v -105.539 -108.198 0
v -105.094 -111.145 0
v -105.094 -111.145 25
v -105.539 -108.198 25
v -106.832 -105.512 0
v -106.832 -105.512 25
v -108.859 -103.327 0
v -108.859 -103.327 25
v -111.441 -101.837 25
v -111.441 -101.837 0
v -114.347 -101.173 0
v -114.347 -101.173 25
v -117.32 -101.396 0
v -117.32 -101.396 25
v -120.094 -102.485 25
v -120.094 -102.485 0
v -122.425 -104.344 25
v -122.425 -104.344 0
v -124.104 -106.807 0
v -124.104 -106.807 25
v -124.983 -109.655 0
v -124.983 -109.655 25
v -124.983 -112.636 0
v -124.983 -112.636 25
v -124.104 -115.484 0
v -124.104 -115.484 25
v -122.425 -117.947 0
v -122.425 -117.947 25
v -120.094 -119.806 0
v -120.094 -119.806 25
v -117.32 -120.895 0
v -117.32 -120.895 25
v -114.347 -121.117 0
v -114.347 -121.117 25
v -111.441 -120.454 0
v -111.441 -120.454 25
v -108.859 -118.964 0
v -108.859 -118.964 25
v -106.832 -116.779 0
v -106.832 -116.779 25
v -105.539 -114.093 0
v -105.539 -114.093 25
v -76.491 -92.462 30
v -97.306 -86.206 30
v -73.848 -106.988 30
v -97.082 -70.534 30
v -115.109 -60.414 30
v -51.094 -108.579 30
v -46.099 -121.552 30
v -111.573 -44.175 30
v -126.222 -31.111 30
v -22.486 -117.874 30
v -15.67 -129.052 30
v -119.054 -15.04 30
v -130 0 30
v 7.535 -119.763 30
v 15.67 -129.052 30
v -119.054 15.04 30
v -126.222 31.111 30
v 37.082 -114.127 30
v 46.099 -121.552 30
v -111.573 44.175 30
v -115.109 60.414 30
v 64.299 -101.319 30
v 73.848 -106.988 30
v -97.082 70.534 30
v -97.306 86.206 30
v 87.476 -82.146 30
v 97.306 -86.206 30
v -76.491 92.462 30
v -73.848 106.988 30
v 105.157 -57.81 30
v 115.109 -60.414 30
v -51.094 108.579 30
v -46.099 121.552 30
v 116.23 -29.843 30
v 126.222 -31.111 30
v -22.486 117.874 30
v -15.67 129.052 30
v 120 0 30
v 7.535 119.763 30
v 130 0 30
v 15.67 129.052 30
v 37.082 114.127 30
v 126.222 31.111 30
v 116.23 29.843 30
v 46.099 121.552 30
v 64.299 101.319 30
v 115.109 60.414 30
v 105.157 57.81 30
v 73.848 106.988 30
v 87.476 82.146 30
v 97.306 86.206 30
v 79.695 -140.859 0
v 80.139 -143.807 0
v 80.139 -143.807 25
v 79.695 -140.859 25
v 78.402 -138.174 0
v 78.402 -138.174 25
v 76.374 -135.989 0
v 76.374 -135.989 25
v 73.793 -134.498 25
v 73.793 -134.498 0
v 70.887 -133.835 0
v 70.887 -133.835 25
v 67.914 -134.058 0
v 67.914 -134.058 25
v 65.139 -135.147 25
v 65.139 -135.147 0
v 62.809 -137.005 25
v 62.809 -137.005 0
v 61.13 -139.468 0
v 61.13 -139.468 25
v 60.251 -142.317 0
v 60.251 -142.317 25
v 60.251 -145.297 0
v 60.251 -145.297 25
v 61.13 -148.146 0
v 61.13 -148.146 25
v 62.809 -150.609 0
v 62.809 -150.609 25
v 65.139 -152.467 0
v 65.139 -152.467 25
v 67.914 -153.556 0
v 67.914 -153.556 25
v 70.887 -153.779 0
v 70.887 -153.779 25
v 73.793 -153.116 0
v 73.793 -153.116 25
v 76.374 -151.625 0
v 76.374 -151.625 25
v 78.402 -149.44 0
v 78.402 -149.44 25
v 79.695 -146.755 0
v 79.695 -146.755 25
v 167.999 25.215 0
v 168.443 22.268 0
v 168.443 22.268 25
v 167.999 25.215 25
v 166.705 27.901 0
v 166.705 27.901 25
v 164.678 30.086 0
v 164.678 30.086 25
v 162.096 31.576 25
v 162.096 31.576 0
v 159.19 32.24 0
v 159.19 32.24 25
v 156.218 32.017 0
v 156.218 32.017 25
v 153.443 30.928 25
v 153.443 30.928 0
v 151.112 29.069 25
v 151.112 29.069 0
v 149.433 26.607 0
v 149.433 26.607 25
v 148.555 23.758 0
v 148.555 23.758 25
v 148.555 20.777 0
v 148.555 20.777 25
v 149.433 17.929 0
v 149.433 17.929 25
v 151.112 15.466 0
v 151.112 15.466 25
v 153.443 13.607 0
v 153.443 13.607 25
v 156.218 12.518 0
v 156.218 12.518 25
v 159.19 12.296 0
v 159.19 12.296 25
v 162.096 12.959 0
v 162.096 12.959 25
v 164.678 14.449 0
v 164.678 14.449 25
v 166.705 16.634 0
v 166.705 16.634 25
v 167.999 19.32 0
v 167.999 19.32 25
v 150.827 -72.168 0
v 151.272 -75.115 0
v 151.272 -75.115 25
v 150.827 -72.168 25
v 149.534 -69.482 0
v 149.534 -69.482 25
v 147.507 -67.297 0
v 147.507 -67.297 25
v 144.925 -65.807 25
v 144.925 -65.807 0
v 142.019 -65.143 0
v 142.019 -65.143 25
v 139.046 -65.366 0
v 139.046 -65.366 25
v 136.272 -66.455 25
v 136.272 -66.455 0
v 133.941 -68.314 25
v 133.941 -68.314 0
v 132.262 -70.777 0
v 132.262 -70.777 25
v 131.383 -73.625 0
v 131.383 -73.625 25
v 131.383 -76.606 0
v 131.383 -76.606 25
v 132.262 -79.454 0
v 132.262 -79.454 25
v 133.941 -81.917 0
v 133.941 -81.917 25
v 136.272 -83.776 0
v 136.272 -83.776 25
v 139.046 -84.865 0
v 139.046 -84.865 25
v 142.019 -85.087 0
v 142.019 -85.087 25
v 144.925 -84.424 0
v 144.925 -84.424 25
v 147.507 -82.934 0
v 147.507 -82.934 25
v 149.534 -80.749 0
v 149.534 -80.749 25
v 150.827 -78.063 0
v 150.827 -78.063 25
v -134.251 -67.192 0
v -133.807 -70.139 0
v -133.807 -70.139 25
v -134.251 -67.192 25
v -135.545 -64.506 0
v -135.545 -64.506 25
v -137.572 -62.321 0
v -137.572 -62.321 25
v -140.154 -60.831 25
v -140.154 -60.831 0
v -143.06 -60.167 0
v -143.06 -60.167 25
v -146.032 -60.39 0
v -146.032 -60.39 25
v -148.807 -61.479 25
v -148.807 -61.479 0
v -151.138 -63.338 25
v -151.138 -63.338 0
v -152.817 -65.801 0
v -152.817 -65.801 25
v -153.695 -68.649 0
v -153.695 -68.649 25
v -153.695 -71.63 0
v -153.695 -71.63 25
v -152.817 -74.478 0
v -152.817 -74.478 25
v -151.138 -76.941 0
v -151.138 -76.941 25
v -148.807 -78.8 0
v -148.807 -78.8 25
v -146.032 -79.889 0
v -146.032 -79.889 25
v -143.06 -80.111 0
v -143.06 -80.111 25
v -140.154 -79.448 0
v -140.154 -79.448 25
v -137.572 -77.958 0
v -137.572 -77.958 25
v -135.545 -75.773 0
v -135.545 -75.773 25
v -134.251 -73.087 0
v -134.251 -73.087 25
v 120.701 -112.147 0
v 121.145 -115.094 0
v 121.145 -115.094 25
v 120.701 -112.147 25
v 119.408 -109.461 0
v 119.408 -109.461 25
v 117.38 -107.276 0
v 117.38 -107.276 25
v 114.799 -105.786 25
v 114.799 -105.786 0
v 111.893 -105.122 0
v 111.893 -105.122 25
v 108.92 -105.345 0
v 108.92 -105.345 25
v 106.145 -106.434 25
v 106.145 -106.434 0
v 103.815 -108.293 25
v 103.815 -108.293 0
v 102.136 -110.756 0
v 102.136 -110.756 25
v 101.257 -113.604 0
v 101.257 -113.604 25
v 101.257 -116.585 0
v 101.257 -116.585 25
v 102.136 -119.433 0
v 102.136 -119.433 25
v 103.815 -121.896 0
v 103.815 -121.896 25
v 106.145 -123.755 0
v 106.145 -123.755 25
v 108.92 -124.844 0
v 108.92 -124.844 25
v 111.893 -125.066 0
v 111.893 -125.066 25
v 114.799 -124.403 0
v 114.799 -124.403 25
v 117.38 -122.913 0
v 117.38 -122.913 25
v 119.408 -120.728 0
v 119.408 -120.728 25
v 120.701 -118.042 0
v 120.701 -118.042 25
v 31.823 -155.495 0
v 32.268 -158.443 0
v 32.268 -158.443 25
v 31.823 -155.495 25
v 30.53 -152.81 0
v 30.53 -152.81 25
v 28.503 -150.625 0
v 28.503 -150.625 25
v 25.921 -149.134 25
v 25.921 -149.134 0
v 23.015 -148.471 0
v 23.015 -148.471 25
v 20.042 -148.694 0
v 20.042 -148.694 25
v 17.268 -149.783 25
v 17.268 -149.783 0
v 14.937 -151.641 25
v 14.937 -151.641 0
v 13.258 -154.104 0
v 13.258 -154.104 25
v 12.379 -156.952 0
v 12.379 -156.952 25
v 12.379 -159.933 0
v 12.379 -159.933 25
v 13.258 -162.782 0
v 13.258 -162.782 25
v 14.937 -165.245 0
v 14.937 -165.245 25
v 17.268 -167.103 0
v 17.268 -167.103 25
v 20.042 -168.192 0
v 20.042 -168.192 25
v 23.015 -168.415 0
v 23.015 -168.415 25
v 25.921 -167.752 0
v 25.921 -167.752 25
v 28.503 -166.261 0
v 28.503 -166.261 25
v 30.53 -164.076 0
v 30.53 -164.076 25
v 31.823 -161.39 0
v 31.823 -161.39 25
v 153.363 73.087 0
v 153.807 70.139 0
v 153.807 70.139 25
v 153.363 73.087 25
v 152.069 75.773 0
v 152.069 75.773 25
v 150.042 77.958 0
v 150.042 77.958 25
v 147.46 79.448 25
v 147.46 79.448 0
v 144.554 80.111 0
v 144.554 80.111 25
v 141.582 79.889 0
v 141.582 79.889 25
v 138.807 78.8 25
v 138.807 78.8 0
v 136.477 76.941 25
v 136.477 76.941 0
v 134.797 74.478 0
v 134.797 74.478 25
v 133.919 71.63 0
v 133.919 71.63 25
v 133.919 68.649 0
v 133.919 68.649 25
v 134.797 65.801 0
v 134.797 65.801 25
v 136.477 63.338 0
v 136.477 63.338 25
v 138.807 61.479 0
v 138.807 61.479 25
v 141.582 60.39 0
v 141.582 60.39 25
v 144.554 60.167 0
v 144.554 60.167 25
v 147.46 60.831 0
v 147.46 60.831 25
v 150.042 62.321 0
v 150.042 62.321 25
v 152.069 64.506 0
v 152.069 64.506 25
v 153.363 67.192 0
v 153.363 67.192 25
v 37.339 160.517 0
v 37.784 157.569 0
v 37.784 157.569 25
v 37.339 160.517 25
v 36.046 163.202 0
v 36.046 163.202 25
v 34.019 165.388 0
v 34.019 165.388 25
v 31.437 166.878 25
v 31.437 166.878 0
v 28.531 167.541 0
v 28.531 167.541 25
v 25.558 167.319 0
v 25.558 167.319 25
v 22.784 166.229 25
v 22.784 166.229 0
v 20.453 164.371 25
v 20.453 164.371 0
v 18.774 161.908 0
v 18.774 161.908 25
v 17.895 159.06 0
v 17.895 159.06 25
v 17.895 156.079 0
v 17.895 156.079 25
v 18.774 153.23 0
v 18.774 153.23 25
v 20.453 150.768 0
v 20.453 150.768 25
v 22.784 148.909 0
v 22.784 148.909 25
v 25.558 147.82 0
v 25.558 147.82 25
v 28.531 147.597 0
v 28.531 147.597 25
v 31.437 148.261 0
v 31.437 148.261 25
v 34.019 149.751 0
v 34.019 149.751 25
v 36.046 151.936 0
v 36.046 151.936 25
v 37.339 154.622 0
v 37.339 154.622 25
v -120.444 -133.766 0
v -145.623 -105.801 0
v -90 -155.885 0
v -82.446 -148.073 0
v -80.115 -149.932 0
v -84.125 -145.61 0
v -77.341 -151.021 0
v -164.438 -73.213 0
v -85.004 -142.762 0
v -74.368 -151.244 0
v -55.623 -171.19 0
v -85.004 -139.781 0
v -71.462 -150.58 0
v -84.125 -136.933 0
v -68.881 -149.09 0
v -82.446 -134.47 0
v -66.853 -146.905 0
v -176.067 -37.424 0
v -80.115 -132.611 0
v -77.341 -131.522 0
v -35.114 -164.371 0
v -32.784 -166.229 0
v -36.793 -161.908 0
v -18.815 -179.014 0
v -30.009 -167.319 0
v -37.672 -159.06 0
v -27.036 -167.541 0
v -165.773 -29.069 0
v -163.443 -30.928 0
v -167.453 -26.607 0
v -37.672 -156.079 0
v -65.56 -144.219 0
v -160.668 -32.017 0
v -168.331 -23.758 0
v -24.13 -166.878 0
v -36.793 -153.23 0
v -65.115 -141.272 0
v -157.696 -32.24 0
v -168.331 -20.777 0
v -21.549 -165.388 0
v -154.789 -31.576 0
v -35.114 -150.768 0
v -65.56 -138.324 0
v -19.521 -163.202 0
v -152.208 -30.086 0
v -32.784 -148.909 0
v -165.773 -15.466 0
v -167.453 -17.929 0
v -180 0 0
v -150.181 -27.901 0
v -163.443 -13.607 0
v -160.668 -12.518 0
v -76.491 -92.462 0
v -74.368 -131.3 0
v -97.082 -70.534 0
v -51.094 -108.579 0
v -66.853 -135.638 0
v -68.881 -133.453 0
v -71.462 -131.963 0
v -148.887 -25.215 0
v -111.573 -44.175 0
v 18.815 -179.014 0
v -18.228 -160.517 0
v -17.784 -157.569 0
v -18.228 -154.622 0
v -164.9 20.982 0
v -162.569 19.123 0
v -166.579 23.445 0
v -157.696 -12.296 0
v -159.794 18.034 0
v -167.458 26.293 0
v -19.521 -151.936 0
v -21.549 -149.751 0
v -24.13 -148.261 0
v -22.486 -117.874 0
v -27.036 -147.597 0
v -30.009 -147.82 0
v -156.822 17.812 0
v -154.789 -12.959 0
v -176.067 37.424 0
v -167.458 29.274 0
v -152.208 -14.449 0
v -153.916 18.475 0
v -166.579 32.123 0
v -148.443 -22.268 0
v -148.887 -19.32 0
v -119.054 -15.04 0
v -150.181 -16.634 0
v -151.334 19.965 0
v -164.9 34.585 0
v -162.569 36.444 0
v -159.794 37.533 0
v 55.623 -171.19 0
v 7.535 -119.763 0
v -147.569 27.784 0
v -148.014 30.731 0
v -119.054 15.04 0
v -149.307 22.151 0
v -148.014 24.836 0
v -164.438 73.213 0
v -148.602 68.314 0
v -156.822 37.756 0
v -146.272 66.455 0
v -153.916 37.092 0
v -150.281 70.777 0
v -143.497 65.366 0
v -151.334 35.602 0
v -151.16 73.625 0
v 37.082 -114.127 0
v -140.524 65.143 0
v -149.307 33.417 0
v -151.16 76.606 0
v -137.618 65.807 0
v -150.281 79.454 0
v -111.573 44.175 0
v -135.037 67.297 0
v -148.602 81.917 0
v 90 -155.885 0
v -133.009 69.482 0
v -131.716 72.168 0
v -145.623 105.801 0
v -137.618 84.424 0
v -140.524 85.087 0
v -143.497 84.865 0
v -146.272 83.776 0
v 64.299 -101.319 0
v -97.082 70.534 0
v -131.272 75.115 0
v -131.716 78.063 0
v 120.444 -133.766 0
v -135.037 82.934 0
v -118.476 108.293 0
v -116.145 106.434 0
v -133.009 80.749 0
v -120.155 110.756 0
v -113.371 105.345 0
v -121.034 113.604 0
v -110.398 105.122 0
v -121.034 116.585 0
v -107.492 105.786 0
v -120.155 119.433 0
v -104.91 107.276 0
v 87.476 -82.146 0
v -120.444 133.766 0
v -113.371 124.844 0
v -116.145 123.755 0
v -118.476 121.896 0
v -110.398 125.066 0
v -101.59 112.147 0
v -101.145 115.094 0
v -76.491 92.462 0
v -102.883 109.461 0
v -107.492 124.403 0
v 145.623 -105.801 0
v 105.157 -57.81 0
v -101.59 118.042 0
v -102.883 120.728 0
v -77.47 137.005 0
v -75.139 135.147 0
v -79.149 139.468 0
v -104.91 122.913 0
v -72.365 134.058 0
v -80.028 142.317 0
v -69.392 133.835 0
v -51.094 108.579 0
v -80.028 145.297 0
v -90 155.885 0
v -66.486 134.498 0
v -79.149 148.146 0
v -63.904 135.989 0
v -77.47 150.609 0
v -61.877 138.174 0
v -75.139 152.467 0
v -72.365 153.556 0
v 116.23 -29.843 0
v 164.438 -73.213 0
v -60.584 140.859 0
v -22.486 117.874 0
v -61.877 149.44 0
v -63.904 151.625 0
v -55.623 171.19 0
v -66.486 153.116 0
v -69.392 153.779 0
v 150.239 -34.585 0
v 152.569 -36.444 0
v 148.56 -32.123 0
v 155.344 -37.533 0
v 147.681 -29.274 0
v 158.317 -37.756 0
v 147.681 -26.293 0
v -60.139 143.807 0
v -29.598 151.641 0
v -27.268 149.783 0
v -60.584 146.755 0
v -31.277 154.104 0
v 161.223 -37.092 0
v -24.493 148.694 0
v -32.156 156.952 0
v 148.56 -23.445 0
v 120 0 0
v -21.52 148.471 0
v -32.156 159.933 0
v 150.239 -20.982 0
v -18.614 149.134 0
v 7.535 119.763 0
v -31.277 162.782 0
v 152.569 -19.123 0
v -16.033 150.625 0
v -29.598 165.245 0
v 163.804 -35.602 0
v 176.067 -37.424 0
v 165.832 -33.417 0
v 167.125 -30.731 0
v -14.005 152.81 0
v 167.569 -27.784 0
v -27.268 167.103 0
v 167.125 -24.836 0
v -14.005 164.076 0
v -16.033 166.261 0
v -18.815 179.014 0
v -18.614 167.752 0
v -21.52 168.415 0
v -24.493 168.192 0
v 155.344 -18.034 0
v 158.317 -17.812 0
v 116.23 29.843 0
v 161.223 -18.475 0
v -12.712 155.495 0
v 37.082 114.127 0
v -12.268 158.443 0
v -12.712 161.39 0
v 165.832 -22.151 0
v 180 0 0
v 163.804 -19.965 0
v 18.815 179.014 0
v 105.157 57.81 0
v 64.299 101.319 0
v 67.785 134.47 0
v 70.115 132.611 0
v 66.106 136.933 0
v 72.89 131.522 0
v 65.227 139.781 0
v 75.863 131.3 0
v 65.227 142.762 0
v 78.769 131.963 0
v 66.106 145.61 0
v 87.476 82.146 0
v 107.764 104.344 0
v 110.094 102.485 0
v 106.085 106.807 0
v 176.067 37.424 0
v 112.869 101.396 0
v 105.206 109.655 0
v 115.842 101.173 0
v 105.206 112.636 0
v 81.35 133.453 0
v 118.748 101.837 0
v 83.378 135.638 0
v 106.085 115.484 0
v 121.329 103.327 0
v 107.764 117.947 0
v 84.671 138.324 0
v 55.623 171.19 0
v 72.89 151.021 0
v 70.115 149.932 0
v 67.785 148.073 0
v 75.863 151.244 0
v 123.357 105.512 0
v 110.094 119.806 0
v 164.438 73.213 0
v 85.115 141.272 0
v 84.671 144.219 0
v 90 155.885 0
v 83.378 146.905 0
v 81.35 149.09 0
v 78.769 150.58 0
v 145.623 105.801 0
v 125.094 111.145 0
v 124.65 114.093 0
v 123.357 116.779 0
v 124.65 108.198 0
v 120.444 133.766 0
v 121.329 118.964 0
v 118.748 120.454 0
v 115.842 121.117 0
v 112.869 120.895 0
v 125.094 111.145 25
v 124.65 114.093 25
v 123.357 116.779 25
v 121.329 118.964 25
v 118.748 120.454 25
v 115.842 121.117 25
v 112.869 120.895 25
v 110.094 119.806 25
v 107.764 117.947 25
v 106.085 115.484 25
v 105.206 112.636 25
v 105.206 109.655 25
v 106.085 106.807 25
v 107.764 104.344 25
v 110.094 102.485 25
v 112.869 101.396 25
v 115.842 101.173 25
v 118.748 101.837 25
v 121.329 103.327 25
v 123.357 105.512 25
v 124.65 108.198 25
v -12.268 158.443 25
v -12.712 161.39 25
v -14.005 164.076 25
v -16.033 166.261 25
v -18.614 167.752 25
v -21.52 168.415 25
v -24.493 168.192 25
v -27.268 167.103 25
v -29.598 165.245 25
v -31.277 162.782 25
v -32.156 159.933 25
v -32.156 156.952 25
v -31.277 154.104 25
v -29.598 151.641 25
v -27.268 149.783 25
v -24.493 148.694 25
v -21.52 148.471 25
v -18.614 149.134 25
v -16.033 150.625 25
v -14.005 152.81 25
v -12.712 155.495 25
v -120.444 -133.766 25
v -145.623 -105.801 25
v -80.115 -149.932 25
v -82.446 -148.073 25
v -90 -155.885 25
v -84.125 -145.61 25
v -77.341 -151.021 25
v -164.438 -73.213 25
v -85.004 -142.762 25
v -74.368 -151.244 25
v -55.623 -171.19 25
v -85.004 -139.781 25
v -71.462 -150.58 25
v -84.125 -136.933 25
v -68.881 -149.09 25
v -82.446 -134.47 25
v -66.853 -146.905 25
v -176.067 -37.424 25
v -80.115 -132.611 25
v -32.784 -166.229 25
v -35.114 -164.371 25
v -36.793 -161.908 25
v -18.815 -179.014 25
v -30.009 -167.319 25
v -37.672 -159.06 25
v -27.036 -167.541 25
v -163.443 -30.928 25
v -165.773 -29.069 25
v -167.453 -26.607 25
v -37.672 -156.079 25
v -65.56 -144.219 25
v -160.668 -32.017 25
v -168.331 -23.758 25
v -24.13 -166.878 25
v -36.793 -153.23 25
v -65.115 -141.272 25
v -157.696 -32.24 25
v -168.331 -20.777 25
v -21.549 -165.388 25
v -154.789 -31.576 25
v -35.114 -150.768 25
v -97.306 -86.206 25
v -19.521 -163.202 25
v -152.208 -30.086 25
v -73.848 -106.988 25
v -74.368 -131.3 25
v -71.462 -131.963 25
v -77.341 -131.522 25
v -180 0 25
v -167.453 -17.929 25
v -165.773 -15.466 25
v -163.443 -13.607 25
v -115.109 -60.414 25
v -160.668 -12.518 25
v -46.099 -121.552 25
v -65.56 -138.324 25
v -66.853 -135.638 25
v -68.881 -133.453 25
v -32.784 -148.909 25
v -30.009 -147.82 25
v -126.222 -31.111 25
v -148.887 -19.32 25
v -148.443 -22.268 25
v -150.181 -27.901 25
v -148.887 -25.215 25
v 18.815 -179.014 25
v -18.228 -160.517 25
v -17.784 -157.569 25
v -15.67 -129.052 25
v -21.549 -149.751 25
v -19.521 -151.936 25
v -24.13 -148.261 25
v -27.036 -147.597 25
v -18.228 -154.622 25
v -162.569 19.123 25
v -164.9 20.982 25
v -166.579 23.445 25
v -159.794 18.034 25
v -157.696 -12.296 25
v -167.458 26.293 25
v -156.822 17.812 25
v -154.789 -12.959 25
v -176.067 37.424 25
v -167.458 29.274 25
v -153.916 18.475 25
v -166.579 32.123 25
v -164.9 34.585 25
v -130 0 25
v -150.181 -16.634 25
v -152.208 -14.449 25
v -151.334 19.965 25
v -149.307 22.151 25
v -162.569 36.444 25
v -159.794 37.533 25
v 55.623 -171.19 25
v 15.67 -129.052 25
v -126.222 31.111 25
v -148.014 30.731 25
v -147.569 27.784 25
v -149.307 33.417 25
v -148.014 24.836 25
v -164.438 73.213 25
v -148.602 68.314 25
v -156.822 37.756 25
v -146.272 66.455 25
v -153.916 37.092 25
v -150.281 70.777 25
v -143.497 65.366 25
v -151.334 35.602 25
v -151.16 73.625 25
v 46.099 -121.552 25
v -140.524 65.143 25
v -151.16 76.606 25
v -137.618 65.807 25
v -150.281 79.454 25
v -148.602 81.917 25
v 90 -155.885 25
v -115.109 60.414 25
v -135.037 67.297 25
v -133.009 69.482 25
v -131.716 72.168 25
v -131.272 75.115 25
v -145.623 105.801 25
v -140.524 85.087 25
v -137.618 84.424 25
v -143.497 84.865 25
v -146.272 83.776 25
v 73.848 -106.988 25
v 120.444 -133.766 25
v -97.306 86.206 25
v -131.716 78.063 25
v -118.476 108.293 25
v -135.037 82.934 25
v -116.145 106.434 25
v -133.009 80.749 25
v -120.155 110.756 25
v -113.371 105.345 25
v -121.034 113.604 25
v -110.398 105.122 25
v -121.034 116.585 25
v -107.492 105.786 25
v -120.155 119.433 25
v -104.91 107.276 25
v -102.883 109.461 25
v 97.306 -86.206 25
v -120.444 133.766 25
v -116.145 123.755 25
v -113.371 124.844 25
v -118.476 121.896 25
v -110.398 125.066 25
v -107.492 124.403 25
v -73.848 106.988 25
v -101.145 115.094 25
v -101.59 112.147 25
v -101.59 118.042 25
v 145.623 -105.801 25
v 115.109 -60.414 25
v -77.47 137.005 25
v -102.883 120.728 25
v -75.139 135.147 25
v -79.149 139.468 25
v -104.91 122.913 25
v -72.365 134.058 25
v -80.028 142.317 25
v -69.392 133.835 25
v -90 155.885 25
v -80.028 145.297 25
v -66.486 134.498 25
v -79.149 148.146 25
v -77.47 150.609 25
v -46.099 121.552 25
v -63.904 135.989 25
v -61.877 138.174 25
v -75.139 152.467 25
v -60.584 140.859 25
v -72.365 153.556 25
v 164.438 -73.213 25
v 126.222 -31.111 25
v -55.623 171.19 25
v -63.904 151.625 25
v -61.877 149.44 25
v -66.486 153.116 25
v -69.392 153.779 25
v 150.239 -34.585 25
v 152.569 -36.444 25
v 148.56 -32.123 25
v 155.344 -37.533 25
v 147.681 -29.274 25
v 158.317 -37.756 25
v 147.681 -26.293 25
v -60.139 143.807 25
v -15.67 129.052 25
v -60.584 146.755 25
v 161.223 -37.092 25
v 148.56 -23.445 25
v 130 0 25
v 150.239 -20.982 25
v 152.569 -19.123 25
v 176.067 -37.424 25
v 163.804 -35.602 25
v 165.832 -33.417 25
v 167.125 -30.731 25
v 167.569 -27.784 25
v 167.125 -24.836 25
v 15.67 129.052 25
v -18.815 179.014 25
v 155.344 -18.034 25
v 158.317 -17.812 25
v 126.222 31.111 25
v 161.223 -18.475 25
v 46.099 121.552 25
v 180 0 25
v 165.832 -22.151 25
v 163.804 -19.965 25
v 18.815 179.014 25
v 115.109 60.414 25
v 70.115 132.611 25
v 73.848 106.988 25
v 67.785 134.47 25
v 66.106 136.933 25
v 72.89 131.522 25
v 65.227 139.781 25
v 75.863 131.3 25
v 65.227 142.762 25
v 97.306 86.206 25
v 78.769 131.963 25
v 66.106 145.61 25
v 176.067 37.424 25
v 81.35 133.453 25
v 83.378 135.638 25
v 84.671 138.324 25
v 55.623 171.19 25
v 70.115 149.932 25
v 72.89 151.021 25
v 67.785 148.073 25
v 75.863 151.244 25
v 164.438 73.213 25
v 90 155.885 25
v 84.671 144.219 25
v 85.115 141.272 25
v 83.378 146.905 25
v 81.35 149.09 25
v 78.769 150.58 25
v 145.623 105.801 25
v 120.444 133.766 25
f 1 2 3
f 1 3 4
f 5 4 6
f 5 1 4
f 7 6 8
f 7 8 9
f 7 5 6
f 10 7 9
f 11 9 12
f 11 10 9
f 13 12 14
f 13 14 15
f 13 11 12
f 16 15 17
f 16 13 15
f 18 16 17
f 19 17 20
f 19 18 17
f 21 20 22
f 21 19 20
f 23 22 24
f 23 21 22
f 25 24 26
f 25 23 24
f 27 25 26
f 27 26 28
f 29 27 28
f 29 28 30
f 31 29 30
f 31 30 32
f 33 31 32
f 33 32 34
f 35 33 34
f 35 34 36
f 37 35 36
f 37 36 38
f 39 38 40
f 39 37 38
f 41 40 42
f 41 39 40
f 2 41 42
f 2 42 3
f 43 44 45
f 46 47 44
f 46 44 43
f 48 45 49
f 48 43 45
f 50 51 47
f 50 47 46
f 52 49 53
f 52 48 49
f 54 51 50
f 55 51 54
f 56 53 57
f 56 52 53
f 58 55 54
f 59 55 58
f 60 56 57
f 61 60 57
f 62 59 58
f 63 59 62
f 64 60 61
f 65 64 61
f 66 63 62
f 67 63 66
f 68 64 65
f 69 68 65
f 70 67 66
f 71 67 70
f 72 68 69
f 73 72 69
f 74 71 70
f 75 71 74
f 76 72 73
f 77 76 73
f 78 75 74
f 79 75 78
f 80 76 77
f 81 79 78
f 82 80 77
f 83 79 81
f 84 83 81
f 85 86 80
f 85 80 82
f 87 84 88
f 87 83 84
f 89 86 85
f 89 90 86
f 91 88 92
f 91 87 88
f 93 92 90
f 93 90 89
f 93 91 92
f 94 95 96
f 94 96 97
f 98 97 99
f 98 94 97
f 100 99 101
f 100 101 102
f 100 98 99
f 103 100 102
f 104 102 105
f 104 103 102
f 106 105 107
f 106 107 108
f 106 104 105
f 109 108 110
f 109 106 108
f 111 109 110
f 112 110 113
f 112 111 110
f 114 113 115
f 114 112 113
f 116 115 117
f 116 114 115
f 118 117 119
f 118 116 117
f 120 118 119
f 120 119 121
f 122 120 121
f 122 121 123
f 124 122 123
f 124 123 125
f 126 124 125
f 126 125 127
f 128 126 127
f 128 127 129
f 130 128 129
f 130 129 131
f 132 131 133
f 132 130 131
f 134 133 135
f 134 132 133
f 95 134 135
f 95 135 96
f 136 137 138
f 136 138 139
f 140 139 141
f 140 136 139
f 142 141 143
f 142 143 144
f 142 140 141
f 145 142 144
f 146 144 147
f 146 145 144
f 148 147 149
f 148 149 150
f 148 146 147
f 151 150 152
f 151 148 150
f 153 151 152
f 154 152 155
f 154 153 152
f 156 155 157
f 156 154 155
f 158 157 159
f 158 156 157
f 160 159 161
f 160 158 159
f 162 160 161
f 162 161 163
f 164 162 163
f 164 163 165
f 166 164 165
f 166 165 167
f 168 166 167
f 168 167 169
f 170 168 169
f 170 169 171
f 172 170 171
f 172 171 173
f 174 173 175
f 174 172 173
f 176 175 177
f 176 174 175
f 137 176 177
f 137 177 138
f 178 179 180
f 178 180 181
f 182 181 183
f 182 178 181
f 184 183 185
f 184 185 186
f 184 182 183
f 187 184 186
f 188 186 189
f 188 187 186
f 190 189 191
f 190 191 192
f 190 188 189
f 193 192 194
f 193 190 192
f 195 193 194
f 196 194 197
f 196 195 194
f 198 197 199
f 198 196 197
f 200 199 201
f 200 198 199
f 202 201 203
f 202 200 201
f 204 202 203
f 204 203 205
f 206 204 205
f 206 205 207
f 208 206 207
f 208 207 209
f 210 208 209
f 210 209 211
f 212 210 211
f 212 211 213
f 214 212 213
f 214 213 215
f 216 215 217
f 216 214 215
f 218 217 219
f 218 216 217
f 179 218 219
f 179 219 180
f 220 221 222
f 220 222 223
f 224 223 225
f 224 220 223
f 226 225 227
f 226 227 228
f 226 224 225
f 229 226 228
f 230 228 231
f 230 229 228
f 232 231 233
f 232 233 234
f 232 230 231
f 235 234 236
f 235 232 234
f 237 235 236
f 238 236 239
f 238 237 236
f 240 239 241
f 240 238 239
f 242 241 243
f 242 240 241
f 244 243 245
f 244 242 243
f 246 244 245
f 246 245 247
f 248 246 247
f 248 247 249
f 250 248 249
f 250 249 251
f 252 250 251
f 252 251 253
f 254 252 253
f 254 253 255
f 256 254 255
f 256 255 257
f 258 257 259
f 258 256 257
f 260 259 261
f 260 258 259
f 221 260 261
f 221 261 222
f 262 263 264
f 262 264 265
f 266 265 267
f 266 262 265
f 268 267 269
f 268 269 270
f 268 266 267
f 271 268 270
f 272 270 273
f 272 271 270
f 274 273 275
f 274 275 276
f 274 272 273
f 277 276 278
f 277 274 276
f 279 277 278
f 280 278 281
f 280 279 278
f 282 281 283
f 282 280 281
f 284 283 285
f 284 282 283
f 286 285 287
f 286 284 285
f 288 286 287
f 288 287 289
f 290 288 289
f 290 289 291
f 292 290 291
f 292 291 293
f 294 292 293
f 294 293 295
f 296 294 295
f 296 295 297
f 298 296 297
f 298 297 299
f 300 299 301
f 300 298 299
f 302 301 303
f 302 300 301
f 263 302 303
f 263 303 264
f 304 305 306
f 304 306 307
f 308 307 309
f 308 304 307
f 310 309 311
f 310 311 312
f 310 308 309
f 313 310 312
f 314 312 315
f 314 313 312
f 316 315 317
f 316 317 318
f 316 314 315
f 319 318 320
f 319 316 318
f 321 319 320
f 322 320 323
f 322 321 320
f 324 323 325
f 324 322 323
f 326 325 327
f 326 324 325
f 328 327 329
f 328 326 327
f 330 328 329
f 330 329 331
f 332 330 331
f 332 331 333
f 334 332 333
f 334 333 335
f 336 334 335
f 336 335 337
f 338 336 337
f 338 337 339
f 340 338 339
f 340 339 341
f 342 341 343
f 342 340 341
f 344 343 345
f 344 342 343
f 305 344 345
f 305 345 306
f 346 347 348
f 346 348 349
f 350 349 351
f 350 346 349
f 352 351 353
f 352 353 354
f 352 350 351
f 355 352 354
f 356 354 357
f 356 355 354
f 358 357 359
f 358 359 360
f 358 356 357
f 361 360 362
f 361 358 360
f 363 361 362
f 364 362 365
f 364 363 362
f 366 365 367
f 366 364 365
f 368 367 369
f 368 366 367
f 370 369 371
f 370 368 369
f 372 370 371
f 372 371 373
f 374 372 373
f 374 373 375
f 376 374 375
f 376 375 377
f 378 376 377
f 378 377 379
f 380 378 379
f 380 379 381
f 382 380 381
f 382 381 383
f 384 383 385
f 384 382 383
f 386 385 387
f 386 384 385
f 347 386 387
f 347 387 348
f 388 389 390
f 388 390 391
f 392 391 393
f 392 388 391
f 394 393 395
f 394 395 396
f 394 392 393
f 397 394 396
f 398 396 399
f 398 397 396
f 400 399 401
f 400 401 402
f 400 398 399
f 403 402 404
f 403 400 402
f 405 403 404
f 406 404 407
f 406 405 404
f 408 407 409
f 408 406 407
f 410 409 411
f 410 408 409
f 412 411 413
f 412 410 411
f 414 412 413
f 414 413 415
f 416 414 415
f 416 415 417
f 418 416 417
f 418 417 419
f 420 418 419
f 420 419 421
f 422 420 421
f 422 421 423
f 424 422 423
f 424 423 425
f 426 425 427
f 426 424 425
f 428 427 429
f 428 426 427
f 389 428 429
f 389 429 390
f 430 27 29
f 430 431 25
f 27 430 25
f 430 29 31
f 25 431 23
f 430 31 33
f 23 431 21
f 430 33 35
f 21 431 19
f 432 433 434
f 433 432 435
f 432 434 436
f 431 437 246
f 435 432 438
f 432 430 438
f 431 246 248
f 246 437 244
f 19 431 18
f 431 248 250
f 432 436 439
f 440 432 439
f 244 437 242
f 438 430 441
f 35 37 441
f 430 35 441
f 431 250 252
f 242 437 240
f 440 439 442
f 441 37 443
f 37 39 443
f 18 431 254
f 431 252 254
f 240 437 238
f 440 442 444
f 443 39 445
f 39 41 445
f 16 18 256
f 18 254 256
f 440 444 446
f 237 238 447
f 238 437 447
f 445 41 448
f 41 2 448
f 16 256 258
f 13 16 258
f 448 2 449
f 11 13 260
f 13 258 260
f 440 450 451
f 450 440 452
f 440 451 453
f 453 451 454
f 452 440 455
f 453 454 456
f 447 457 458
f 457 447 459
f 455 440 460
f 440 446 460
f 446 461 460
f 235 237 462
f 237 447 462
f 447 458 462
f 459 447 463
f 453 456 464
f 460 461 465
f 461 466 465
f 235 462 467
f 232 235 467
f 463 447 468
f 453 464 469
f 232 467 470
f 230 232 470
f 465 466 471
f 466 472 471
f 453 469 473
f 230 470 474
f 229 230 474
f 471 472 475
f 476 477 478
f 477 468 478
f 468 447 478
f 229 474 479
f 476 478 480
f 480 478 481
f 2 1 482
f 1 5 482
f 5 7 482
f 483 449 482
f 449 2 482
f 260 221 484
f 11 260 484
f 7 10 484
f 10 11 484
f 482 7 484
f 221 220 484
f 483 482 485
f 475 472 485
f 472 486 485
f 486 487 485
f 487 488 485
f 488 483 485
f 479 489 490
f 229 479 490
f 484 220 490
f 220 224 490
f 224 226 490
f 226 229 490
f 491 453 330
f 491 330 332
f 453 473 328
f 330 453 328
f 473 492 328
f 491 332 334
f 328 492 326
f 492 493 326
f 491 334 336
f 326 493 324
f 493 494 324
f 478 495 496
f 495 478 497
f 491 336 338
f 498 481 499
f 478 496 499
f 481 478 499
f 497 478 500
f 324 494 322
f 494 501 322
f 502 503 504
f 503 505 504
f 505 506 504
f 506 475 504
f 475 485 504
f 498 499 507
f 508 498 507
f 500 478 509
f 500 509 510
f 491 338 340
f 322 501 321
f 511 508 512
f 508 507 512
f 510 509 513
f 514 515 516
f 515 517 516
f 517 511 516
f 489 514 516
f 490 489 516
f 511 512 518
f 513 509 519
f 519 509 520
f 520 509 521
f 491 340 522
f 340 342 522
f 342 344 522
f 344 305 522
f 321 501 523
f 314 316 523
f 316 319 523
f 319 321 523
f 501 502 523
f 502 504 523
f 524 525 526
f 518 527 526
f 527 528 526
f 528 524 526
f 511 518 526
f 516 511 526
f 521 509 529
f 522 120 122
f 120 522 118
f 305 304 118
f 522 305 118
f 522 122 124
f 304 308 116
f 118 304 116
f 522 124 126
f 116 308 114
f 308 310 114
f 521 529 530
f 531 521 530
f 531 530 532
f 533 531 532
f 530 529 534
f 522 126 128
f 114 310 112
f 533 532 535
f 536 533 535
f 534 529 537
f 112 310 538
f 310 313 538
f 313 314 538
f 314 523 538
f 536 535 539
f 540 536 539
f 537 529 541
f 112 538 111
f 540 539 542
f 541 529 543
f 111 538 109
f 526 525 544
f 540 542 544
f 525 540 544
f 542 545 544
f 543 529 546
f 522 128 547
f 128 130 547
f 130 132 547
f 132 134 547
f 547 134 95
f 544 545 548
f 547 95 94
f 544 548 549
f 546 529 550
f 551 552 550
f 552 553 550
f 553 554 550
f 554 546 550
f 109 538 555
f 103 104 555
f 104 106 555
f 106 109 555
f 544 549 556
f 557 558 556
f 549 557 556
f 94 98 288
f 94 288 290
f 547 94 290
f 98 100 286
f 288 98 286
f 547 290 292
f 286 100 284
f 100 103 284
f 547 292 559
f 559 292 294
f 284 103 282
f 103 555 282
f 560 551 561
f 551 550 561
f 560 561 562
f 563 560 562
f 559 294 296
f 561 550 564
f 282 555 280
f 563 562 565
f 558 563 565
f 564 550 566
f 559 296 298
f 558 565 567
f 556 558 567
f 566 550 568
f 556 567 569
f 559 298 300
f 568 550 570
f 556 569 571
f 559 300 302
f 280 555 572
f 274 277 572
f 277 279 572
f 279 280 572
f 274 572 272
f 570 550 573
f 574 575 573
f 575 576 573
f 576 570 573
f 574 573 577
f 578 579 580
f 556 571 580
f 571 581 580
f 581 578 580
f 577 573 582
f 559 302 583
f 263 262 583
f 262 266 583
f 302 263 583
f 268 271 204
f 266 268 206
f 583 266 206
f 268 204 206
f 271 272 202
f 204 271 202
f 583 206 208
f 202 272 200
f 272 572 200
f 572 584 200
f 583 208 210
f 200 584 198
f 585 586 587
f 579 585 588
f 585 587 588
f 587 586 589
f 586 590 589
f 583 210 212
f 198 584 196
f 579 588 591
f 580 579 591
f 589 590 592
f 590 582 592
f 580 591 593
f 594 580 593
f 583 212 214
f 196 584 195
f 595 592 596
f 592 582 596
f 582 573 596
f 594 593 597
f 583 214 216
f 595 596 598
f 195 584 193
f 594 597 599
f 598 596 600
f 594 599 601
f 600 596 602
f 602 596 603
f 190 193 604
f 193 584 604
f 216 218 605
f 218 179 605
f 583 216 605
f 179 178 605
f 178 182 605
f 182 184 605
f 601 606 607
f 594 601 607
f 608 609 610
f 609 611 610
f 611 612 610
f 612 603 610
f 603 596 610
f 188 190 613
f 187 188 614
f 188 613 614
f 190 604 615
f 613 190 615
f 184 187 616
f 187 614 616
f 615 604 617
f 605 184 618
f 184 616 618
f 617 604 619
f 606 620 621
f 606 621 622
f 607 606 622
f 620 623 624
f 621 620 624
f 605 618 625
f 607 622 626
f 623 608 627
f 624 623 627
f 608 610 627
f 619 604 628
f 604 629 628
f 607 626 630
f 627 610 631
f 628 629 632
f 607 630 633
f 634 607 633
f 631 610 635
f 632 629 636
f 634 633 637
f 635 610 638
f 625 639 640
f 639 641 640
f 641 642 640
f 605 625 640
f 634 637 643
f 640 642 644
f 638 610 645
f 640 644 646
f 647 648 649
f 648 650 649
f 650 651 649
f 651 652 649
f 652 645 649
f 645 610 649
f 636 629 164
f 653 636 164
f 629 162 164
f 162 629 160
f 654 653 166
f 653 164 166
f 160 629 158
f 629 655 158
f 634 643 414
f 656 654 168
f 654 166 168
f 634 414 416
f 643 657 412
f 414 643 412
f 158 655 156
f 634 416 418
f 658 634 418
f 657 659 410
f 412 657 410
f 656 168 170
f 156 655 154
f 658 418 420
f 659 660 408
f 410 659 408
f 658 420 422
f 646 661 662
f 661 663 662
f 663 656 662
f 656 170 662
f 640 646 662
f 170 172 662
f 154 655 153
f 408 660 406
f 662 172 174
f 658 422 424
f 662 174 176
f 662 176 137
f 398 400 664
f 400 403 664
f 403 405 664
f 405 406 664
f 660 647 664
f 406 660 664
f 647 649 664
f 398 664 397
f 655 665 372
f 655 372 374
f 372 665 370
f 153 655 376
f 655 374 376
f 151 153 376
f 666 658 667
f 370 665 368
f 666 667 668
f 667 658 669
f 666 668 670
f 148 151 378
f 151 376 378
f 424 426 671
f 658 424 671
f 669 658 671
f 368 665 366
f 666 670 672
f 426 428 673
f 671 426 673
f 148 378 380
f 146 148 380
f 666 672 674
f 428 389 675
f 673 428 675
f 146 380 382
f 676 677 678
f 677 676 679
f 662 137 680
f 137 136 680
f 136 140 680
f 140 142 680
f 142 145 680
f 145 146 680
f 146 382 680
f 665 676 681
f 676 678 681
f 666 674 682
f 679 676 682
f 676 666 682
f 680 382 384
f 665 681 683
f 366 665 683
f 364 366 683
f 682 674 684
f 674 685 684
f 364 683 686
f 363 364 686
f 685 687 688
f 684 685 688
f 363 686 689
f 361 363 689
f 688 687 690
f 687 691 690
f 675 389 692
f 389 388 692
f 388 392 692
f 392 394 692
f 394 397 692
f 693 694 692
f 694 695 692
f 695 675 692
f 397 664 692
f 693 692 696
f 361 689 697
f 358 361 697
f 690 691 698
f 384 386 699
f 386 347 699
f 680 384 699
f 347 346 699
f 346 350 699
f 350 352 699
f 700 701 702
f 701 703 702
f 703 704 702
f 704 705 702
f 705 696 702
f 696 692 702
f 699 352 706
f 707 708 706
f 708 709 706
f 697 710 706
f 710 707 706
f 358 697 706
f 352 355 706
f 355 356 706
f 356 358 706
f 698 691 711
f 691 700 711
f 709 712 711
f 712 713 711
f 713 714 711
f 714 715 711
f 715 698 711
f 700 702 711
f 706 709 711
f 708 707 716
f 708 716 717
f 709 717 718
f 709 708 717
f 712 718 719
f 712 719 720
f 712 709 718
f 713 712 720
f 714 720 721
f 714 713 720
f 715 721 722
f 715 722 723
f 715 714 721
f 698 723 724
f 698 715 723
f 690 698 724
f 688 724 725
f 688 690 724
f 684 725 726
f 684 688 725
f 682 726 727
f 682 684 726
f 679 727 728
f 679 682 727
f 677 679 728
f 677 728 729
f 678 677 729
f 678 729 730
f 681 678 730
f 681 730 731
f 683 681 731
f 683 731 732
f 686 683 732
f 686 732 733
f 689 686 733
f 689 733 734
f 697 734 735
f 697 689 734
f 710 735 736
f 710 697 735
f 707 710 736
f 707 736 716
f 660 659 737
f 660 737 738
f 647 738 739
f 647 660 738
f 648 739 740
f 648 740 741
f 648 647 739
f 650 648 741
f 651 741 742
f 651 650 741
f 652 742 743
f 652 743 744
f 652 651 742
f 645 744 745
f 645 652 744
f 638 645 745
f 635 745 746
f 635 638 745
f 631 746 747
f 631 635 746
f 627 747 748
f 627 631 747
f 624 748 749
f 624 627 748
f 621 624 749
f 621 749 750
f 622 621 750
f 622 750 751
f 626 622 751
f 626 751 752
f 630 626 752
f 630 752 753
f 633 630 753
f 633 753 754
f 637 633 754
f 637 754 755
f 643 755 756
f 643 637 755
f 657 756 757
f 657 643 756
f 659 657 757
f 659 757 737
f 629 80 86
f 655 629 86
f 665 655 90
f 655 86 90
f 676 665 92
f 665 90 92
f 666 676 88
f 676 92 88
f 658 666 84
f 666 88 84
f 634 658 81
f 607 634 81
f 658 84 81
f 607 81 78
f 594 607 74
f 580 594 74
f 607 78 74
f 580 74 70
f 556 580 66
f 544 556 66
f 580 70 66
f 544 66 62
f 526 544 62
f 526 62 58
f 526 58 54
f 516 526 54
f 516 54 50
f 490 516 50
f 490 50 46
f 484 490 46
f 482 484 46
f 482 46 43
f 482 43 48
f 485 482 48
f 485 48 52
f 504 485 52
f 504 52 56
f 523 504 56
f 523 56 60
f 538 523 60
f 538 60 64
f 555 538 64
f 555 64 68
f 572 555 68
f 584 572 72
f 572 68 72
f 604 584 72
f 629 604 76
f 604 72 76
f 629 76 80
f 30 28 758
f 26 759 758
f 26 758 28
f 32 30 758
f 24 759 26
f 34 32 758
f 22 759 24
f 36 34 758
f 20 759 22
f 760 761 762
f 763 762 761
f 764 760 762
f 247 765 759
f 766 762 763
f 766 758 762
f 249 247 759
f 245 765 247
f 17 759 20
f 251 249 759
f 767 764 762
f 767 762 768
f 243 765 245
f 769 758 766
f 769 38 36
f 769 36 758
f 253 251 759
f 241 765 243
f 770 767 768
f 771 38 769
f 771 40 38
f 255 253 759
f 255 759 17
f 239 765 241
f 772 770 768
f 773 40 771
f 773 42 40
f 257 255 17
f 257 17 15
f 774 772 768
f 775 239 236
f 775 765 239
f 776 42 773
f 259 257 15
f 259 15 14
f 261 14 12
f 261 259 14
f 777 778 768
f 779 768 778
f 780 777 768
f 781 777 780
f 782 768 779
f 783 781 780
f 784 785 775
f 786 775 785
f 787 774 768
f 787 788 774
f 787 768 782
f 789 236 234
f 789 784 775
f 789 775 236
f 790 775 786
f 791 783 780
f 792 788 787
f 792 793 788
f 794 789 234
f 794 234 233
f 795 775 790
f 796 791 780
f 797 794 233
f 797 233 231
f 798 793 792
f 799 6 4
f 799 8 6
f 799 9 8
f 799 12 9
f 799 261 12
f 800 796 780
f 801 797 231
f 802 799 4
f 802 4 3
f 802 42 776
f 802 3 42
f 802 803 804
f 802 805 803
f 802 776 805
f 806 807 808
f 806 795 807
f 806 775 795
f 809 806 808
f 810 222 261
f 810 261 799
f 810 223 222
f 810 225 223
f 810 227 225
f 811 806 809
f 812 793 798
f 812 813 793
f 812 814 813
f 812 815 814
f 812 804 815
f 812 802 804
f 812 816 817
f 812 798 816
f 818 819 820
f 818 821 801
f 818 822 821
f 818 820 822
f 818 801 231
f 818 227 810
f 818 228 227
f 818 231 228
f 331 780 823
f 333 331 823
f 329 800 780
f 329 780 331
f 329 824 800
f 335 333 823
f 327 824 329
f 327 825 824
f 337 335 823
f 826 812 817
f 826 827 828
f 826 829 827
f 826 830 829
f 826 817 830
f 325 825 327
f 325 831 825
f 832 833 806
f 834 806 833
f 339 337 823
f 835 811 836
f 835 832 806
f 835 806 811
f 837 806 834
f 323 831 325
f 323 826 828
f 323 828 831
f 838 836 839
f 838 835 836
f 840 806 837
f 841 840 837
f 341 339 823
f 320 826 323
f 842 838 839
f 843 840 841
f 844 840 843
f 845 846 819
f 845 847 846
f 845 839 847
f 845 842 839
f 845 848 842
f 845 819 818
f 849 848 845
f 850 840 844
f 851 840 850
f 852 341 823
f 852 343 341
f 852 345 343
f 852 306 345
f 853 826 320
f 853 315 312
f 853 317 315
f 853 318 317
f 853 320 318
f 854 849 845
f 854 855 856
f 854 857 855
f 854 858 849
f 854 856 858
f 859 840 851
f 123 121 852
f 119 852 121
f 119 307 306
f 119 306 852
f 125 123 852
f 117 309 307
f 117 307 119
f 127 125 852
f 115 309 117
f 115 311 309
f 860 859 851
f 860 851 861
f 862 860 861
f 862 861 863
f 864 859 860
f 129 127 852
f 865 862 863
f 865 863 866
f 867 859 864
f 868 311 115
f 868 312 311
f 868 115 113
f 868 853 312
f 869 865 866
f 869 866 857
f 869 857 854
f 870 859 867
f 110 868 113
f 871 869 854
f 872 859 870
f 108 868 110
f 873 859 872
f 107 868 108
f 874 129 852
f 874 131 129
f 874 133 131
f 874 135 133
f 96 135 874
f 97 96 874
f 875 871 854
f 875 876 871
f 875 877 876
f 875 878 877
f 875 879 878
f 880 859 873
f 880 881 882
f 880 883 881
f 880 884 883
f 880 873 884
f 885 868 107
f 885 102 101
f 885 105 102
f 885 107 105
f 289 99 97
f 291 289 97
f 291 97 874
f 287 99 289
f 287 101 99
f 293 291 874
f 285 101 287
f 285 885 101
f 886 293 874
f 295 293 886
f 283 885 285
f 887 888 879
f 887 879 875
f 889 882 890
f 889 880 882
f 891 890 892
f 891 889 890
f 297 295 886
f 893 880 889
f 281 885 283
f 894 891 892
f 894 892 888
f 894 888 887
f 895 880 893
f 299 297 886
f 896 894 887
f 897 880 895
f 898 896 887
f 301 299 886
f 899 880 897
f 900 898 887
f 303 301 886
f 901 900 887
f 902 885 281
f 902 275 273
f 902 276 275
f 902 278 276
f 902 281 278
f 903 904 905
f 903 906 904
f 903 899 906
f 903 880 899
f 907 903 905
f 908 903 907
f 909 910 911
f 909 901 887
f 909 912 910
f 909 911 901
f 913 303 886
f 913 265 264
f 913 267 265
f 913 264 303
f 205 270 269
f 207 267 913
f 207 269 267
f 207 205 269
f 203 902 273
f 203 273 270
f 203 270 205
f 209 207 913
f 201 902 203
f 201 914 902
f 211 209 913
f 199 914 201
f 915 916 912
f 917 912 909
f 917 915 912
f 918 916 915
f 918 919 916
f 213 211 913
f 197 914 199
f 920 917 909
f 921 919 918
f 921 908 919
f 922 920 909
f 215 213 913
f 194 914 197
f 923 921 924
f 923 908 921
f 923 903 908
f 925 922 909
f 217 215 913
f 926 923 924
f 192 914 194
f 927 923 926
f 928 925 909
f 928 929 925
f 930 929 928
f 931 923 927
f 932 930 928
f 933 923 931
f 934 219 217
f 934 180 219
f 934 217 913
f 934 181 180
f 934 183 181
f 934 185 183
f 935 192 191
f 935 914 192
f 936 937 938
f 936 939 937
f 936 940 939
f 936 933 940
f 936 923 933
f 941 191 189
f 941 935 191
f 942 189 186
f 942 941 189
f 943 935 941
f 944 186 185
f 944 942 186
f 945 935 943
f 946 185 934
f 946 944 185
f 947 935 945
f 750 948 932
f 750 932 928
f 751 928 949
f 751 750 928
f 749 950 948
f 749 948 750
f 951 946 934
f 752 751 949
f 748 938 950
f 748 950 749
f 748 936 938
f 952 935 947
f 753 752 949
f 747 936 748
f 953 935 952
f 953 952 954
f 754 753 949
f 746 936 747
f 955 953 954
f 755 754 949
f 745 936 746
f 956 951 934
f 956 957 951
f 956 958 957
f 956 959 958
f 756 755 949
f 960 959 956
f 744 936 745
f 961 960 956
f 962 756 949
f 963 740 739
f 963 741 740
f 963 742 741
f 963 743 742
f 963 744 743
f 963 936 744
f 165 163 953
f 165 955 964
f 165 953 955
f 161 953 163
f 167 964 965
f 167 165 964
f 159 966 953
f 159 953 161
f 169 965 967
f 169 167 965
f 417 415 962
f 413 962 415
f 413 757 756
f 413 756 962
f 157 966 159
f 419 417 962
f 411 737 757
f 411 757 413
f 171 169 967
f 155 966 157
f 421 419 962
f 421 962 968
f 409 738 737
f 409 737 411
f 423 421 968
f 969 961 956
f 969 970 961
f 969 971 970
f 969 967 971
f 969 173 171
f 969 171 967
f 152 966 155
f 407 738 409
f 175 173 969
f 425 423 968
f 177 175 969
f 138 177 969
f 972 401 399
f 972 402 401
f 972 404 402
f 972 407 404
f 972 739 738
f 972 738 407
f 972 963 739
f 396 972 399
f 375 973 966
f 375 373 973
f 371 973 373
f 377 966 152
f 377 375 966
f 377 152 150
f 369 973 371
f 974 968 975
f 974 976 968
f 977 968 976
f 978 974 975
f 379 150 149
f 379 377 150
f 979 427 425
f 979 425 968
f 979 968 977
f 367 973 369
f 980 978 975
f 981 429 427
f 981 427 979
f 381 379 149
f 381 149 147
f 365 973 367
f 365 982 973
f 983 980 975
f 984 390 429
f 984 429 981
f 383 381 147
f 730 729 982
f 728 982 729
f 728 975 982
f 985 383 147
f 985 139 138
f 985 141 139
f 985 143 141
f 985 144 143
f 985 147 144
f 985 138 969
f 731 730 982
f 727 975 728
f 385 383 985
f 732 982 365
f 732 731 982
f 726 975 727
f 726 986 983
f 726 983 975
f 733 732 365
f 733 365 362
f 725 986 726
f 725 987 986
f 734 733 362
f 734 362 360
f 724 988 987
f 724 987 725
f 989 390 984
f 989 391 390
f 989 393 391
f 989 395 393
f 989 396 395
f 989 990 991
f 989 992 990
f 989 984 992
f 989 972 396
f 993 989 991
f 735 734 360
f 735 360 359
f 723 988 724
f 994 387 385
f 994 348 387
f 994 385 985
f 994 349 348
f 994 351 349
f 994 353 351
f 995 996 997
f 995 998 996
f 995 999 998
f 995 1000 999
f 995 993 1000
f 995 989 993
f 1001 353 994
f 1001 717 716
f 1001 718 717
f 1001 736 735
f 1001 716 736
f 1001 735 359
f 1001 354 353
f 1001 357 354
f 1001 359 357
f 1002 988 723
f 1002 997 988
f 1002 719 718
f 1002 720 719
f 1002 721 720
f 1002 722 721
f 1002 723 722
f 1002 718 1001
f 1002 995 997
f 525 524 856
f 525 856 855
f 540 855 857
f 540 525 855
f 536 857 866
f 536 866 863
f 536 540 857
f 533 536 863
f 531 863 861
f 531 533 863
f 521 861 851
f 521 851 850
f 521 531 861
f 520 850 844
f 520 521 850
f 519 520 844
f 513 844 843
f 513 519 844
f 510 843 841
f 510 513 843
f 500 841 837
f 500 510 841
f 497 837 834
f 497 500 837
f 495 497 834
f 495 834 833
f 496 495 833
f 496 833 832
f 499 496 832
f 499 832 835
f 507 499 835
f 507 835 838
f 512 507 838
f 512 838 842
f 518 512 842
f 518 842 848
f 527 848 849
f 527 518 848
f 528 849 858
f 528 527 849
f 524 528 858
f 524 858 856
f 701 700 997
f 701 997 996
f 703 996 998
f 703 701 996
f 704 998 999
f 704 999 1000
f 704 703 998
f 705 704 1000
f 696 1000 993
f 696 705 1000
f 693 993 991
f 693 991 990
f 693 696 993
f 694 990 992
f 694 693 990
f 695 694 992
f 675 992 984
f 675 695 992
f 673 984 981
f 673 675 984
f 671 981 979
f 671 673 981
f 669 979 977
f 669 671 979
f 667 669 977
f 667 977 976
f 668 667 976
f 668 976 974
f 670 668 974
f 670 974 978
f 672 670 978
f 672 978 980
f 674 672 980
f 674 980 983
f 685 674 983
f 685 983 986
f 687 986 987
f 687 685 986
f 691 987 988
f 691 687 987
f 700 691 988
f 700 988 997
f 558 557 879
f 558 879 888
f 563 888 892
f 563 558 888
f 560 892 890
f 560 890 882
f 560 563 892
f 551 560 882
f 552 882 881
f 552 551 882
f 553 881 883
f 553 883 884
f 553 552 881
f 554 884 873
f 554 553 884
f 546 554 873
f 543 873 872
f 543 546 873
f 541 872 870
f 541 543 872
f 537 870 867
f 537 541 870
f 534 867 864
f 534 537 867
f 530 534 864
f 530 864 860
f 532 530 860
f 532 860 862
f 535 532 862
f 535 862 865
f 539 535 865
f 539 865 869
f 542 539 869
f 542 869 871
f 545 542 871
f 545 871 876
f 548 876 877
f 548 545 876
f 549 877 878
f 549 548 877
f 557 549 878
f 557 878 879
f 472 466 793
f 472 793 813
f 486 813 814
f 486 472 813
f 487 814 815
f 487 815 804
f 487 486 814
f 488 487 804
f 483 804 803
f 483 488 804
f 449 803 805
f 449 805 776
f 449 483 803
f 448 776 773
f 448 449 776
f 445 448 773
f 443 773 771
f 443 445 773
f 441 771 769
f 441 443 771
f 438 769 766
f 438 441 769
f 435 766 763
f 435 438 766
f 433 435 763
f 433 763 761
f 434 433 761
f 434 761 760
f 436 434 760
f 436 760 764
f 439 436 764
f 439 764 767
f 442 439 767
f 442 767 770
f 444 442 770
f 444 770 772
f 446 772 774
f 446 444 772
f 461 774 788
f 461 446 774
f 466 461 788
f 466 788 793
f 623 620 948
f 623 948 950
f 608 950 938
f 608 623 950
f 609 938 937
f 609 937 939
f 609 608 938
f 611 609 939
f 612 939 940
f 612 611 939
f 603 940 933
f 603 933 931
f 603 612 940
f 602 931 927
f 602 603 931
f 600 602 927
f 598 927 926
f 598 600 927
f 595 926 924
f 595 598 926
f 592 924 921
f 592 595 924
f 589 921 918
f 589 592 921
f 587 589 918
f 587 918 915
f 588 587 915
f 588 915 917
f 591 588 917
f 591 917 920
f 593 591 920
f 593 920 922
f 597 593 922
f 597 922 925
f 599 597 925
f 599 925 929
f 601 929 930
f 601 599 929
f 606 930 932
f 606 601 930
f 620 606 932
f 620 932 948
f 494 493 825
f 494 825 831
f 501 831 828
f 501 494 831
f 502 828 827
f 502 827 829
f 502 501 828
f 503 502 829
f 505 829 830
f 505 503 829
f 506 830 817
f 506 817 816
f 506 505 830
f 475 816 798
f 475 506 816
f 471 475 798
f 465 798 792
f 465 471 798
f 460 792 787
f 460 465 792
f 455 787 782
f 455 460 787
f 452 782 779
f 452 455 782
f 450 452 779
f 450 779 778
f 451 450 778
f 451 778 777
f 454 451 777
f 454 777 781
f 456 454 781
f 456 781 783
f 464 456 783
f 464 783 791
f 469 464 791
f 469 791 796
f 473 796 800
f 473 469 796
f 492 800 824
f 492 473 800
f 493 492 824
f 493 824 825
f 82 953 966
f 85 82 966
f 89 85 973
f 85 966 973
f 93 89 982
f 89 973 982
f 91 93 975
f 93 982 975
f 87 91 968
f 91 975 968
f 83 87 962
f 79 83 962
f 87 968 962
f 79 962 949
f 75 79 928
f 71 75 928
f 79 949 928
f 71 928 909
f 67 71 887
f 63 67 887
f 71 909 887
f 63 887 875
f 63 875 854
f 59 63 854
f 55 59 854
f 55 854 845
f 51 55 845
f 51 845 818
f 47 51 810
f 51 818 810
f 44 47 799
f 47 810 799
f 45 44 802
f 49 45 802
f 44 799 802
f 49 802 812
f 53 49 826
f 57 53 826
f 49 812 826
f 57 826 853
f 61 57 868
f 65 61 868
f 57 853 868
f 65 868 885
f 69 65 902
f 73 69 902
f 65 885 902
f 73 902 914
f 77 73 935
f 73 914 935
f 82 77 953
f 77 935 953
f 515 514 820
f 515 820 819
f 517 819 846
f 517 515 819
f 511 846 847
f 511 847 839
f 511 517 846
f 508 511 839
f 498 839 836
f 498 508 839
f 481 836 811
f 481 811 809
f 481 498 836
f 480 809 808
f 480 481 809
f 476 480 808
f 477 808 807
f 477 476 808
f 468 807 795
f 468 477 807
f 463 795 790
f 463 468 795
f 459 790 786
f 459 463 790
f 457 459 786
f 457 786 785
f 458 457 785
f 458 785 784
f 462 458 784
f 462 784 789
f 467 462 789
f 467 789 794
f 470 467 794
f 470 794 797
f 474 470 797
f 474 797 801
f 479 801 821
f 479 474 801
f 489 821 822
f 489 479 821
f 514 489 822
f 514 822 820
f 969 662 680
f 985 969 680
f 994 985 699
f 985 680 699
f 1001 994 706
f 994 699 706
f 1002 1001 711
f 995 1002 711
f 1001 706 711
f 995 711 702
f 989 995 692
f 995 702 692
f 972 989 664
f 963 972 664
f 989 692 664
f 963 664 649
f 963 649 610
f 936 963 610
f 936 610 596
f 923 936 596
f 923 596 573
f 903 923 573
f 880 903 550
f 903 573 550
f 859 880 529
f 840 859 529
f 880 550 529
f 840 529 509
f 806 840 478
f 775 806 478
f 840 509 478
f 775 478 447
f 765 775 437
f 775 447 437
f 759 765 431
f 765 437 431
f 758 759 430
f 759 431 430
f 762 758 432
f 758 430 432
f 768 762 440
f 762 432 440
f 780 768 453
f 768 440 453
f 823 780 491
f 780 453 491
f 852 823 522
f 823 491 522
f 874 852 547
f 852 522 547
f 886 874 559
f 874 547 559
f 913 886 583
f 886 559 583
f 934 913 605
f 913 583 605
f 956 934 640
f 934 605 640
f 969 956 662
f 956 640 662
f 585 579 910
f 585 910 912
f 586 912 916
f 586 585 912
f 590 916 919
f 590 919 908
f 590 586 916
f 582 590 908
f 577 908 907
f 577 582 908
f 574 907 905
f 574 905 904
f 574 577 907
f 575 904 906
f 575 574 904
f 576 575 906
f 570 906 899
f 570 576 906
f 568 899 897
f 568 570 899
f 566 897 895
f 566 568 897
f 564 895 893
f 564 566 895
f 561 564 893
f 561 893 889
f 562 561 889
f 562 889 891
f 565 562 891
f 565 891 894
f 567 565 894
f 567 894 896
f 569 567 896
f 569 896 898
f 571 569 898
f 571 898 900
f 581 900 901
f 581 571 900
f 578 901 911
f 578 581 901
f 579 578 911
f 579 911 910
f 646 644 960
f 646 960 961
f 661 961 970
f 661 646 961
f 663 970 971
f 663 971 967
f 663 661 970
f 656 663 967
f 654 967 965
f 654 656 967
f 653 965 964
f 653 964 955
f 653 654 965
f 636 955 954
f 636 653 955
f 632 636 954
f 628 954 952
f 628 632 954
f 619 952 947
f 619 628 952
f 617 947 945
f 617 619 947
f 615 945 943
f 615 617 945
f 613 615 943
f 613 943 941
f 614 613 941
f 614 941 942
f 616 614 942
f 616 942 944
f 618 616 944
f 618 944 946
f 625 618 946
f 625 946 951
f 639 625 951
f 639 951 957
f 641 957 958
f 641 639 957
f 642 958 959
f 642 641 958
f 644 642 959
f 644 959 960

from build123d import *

# Parameters (mm, degrees)
F0_R     = 180
F0_R_2   = 10
F1_DEPTH = 25
F2_R     = 130
F3_DEPTH = 5
F4_R     = 120
F5_DEPTH = 30.001


with BuildPart() as f1:
    # F0 (on Top) → F1 (new body)
    with BuildSketch(Plane.XY):
        Circle(F0_R)
        with Locations((-115.094368, -111.145339)):
            Circle(F0_R_2, mode=Mode.SUBTRACT)
        with Locations((-75.11545, -141.271615)):
            Circle(F0_R_2, mode=Mode.SUBTRACT)
        with Locations((-27.783708, -157.56924)):
            Circle(F0_R_2, mode=Mode.SUBTRACT)
        with Locations((-143.807047, -70.139383)):
            Circle(F0_R_2, mode=Mode.SUBTRACT)
        with Locations((-158.442891, -22.267696)):
            Circle(F0_R_2, mode=Mode.SUBTRACT)
        with Locations((22.267696, -158.442891)):
            Circle(F0_R_2, mode=Mode.SUBTRACT)
        with Locations((70.139383, -143.807047)):
            Circle(F0_R_2, mode=Mode.SUBTRACT)
        with Locations((111.145339, -115.094368)):
            Circle(F0_R_2, mode=Mode.SUBTRACT)
        with Locations((141.271615, -75.11545)):
            Circle(F0_R_2, mode=Mode.SUBTRACT)
        with Locations((157.56924, -27.783708)):
            Circle(F0_R_2, mode=Mode.SUBTRACT)
        with Locations((-157.56924, 27.783708)):
            Circle(F0_R_2, mode=Mode.SUBTRACT)
        with Locations((-141.271615, 75.11545)):
            Circle(F0_R_2, mode=Mode.SUBTRACT)
        with Locations((-111.145339, 115.094368)):
            Circle(F0_R_2, mode=Mode.SUBTRACT)
        with Locations((-70.139383, 143.807047)):
            Circle(F0_R_2, mode=Mode.SUBTRACT)
        with Locations((-22.267696, 158.442891)):
            Circle(F0_R_2, mode=Mode.SUBTRACT)
        with Locations((158.442891, 22.267696)):
            Circle(F0_R_2, mode=Mode.SUBTRACT)
        with Locations((143.807047, 70.139383)):
            Circle(F0_R_2, mode=Mode.SUBTRACT)
        with Locations((27.783708, 157.56924)):
            Circle(F0_R_2, mode=Mode.SUBTRACT)
        with Locations((75.11545, 141.271615)):
            Circle(F0_R_2, mode=Mode.SUBTRACT)
        with Locations((115.094368, 111.145339)):
            Circle(F0_R_2, mode=Mode.SUBTRACT)
    extrude(amount=F1_DEPTH)

    # F2 (on face) → F3 (join)
    with BuildSketch(Plane.XY.offset(25)):
        Circle(F2_R)
    extrude(amount=F3_DEPTH)

    # F4 (on face) → F5 (cut, through all)
    with BuildSketch(Plane.XY.offset(30)):
        Circle(F4_R)
    extrude(amount=-F5_DEPTH, mode=Mode.SUBTRACT)


solid = f1.part
